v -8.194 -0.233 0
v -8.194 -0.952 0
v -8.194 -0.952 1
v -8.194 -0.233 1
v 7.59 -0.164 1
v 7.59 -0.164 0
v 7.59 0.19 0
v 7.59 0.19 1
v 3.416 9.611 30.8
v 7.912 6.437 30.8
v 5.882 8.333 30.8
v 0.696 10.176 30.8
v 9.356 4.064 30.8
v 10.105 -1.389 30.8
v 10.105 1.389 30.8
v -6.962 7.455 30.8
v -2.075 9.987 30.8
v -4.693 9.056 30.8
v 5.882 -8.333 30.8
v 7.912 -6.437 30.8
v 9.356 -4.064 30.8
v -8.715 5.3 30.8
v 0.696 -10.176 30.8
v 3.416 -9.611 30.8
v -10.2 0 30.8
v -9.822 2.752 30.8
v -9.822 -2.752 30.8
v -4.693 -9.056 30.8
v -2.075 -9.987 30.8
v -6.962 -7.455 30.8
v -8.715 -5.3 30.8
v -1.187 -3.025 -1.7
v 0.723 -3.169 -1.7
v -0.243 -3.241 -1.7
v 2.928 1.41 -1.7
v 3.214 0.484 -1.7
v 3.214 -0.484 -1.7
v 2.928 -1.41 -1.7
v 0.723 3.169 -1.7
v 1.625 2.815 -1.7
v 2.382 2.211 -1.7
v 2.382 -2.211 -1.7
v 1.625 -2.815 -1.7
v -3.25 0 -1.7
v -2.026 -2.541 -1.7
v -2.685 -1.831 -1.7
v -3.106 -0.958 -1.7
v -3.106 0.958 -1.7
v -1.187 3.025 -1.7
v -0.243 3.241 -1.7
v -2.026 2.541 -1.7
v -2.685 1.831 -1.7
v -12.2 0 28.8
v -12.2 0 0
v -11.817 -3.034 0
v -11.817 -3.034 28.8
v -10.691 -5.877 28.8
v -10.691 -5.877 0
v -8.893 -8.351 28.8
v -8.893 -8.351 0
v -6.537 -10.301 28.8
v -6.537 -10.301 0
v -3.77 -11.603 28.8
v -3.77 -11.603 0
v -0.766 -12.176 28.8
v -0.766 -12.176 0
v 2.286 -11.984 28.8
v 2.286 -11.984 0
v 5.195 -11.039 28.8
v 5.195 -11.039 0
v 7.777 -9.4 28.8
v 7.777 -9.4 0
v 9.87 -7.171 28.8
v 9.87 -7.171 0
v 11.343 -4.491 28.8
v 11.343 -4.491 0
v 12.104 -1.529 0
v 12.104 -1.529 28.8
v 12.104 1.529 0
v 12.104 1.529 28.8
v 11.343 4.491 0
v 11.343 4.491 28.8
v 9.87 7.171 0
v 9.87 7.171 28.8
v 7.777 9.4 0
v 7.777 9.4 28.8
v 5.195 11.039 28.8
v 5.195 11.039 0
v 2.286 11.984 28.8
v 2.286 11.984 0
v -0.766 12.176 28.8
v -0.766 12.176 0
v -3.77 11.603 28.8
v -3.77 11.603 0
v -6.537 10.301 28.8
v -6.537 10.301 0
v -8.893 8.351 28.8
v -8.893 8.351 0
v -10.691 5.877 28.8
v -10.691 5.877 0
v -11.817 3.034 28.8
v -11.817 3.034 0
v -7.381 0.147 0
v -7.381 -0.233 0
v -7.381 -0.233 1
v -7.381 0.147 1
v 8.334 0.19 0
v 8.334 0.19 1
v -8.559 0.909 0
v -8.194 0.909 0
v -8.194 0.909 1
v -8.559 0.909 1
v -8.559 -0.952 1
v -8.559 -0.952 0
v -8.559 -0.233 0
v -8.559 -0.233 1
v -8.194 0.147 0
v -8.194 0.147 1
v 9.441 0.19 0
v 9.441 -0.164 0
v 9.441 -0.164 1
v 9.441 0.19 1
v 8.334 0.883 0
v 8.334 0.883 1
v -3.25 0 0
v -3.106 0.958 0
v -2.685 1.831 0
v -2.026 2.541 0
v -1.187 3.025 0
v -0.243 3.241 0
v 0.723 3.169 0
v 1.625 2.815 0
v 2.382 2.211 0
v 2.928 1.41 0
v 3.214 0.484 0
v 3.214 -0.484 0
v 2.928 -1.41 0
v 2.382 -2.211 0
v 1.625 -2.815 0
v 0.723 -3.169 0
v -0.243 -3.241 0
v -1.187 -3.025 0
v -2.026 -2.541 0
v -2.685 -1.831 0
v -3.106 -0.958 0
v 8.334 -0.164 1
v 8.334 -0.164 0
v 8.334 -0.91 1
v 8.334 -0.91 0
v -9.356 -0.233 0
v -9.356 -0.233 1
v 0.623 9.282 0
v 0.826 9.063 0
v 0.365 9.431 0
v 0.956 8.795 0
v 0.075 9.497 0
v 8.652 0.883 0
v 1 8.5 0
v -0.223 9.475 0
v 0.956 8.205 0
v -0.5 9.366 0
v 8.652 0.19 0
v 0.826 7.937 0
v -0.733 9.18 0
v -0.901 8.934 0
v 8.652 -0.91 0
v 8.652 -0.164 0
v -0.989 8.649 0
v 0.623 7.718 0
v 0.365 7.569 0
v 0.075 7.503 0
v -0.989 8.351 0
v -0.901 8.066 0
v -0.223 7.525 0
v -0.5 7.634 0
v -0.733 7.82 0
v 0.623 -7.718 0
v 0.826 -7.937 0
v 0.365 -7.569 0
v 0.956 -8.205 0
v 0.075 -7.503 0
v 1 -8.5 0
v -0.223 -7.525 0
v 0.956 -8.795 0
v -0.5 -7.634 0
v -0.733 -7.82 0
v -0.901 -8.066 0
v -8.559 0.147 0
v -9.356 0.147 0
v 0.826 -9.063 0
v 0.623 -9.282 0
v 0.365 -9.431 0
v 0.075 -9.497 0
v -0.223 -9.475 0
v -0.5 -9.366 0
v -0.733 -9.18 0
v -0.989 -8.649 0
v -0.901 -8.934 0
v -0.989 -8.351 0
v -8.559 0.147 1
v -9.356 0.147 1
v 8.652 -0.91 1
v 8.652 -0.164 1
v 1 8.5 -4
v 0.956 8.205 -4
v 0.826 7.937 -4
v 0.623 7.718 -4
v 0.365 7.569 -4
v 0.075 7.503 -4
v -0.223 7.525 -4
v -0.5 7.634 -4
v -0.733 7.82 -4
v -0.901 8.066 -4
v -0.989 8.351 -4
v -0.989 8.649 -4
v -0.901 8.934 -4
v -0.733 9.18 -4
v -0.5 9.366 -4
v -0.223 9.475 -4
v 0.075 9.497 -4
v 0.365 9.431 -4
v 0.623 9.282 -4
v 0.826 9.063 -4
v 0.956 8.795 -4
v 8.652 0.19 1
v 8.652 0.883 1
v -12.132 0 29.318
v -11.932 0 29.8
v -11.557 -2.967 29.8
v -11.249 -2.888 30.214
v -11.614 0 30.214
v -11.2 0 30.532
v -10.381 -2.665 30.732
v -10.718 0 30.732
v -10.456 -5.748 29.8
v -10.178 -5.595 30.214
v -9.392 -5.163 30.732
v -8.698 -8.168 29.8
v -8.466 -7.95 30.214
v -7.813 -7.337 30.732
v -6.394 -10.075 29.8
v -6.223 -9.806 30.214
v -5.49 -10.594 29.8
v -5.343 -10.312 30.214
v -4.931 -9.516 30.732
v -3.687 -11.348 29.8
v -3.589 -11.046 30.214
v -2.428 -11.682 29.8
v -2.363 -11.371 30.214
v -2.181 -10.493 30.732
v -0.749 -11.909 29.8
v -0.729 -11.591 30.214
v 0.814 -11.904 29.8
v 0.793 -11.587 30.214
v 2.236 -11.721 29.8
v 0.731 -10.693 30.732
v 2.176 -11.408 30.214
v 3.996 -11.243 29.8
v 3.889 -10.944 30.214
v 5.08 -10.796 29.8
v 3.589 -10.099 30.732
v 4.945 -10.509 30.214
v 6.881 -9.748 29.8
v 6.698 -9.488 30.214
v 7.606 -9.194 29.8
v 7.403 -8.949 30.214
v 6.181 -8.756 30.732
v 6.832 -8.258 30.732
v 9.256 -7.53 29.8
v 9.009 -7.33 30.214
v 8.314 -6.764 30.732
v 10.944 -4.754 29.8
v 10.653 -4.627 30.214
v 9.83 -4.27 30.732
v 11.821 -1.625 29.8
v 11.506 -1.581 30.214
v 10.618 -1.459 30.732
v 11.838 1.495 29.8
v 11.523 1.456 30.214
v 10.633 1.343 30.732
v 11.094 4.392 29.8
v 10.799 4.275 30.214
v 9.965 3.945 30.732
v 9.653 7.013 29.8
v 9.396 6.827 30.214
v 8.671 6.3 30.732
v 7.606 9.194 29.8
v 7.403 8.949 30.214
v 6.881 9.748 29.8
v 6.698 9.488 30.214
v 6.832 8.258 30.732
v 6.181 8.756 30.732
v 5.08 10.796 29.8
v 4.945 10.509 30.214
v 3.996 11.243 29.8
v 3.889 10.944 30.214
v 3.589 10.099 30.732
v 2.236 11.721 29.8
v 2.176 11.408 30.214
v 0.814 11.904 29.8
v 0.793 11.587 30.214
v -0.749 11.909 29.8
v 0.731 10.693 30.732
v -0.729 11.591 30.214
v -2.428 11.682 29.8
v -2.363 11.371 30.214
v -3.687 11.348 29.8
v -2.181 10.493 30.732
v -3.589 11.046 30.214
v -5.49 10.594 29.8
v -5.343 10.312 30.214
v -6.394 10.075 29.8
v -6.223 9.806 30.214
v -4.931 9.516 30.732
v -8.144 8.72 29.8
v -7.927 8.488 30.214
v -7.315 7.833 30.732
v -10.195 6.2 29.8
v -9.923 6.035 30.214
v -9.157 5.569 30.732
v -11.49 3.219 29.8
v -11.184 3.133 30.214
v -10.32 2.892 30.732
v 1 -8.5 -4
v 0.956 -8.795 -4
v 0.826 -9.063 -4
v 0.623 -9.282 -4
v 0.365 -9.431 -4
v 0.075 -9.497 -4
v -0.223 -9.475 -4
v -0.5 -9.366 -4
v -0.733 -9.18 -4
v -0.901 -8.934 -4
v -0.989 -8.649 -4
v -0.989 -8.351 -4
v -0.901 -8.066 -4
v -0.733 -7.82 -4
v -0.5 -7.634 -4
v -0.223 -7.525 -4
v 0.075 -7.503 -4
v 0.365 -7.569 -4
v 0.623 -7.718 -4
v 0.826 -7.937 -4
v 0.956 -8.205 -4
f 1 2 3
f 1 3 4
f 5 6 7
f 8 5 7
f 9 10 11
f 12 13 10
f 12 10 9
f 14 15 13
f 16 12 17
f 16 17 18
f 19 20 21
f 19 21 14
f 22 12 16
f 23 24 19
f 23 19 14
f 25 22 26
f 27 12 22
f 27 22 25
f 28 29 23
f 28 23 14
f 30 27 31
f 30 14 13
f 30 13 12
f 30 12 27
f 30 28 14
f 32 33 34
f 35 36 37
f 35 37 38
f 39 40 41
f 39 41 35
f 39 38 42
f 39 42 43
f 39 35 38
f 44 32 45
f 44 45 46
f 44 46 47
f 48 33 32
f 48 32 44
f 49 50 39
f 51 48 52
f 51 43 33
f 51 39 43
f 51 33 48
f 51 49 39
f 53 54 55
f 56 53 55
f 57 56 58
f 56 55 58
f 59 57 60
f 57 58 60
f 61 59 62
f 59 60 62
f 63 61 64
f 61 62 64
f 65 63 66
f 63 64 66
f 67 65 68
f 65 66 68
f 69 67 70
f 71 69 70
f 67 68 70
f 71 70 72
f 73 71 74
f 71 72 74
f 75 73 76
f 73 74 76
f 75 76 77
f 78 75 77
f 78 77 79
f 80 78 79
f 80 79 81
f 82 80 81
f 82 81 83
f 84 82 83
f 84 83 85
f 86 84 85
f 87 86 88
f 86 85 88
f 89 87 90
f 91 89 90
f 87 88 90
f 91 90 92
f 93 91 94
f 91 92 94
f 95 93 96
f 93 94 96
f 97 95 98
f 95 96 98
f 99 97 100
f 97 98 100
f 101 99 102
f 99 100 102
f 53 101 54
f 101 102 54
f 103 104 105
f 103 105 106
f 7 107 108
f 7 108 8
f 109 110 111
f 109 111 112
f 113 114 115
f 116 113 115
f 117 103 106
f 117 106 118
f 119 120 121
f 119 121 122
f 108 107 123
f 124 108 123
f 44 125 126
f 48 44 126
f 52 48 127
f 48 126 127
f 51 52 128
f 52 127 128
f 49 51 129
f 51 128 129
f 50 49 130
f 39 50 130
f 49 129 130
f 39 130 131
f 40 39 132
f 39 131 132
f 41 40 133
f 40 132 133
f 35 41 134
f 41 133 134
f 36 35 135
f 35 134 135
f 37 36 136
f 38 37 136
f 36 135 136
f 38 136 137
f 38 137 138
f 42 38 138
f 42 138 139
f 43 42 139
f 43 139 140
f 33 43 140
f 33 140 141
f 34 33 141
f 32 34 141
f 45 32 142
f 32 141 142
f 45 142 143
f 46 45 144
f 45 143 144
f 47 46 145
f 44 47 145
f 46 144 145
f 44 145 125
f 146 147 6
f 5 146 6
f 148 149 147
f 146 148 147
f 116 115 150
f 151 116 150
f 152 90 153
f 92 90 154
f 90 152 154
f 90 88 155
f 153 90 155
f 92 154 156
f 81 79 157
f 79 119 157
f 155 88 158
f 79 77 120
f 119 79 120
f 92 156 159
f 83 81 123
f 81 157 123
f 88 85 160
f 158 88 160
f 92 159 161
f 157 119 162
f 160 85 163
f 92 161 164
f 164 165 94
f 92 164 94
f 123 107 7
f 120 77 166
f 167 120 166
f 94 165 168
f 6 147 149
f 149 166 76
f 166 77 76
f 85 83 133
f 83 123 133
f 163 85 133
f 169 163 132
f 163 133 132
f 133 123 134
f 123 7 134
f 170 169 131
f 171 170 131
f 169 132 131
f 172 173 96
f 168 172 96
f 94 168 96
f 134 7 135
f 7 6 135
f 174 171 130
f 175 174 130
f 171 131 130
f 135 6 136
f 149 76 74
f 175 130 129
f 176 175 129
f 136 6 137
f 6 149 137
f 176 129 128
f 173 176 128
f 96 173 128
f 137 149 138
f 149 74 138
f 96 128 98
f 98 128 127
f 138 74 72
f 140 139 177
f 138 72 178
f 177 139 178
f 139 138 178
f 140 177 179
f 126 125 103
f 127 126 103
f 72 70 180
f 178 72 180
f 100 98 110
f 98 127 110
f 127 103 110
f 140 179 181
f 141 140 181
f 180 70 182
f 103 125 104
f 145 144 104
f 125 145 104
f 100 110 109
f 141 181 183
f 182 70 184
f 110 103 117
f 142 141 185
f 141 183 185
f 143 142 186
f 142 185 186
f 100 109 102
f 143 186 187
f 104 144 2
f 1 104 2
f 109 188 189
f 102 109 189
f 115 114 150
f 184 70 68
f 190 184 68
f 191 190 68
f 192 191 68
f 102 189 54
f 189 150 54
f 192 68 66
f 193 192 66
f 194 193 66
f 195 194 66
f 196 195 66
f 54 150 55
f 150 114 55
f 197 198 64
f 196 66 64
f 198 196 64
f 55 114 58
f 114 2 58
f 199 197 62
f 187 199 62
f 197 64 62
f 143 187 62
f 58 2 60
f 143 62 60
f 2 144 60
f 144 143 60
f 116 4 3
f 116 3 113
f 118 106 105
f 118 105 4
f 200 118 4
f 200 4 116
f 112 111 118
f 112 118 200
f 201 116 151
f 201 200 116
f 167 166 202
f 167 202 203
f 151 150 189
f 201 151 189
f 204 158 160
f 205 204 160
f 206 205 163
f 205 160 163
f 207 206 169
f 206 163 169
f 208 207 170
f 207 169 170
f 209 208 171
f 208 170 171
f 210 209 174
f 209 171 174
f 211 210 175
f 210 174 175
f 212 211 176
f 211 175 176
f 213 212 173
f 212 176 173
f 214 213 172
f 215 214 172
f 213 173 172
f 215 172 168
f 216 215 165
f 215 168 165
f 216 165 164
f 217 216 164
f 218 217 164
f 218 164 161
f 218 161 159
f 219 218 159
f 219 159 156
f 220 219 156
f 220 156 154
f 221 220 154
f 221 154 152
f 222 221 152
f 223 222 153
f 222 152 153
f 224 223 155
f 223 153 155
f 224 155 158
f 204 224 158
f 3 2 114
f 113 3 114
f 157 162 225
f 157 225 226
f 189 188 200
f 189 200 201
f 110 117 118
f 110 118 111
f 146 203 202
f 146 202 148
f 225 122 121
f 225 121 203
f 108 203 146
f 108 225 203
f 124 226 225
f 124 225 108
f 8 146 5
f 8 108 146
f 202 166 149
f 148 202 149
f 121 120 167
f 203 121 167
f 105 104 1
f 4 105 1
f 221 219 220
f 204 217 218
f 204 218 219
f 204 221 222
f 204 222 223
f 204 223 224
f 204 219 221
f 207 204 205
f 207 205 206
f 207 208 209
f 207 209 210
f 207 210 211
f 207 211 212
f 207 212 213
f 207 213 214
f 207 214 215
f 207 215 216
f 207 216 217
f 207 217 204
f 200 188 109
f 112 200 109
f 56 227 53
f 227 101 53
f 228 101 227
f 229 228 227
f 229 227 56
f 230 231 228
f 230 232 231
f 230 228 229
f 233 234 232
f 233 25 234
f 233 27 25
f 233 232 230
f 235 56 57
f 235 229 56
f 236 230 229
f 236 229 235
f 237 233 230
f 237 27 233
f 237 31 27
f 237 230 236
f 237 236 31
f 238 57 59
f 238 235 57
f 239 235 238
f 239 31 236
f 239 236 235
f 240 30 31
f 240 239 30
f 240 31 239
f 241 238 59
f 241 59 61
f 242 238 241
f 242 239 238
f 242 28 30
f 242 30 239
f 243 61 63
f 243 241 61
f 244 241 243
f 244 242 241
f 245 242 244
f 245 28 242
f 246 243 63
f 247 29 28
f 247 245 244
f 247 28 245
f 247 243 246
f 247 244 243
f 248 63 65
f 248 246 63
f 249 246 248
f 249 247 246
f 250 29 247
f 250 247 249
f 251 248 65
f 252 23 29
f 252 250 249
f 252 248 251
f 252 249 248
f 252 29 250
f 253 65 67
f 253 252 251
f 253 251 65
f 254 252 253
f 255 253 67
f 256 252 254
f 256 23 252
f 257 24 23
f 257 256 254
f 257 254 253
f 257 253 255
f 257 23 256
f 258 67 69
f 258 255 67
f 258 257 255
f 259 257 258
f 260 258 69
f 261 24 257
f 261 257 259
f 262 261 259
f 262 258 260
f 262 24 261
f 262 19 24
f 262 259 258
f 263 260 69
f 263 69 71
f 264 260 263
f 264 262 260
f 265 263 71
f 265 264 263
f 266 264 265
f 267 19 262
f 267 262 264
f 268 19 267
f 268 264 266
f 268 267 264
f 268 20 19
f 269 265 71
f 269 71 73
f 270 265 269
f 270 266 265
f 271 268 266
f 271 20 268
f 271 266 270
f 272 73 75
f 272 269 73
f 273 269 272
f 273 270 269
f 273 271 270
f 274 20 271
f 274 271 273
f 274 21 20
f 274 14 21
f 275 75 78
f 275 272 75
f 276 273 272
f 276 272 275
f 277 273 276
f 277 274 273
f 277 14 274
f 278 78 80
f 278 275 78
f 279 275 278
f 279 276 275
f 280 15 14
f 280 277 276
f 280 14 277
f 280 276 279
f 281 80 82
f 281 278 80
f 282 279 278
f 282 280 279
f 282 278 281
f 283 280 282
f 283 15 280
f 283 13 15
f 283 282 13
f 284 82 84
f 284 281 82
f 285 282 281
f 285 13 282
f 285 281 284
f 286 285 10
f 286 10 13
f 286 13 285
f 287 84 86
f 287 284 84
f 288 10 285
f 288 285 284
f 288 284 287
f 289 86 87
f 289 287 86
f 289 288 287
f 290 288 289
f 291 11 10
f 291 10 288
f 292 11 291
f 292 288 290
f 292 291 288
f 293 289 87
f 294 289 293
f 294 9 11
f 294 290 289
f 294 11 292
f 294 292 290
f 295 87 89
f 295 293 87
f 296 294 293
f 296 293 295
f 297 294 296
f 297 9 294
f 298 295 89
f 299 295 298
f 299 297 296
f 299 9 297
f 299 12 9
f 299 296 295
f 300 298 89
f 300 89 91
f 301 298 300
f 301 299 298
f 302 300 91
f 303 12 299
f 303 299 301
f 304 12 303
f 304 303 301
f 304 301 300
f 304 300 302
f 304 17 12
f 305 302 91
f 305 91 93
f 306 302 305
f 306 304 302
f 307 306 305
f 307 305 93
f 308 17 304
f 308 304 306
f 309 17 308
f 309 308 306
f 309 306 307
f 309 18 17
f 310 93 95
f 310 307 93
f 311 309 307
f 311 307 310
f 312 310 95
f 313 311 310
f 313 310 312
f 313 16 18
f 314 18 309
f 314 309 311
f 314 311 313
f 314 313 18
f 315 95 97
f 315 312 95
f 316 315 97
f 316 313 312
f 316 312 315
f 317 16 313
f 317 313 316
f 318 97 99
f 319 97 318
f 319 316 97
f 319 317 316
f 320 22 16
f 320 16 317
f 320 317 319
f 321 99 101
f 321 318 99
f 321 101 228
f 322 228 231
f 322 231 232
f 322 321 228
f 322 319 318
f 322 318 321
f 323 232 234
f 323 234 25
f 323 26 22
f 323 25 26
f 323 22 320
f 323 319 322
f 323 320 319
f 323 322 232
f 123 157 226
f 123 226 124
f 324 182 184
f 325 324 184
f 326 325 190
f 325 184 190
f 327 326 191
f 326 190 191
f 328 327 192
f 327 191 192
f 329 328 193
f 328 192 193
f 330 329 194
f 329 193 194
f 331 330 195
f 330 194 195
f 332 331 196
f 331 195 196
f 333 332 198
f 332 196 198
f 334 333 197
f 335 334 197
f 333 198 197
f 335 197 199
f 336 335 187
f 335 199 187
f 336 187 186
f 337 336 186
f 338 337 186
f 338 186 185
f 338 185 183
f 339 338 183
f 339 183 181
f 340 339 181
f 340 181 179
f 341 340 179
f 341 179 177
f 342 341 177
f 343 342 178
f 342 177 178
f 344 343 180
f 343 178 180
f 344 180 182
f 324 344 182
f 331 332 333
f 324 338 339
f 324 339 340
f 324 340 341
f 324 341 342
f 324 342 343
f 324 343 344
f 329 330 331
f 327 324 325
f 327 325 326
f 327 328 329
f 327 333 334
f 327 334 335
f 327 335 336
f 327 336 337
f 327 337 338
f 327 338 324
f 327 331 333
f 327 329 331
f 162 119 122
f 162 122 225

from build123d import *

# Parameters (mm, degrees)
SKETCH_1_R          = 12.2
EXTRUDE_1_DEPTH     = 30.8
FILLET_1_R          = 2
SKETCH_2_R          = 3.25
EXTRUDE_2_DEPTH     = 1.7
SKETCH_5_R          = 1
EXTRUDE_4_DEPTH     = 4
SKETCH_7_W          = 1.851248616
SKETCH_7_H          = 0.354328631
CUT_EXTRUDE_1_DEPTH = 1
SKETCH_8_W          = 0.317488429
SKETCH_8_H          = 1.793967755
CUT_EXTRUDE_2_DEPTH = 1
SKETCH_10_W         = 0.364887613
SKETCH_10_H         = 1.860802793
CUT_EXTRUDE_4_DEPTH = 1
SKETCH_11_W         = 1.9755237
SKETCH_11_H         = 0.380671715
CUT_EXTRUDE_5_DEPTH = 1


with BuildPart() as part:
    # 草图1 → 凸台-拉伸1 (new body)
    with BuildSketch(Plane.XY):
        with Locations(Location((0, 0, 0), (0, 0, 180))):
            Circle(SKETCH_1_R)
    extrude(amount=EXTRUDE_1_DEPTH)

    # 圆角1
    fillet_1_edges = [part.edges().sort_by_distance(p)[0] for p in [
        (12.2, 0, 30.8),
    ]]
    fillet(fillet_1_edges, radius=FILLET_1_R)

    # 草图2 → 凸台-拉伸2 (add)
    with BuildSketch(Plane(origin=(0, 0, 0), x_dir=(-1, 0, 0), z_dir=(0, 0, -1))):
        Circle(SKETCH_2_R)
    extrude(amount=EXTRUDE_2_DEPTH)

    # 草图5 → 凸台-拉伸4 (add)
    with BuildSketch(Plane(origin=(0, 0, 0), x_dir=(-1, 0, 0), z_dir=(0, 0, -1))):
        with Locations(Location((0, -8.5, 0), (0, 0, 180))):
            Circle(SKETCH_5_R)
        with Locations(Location((0, 8.5, 0), (0, 0, 180))):
            Circle(SKETCH_5_R)
    extrude(amount=EXTRUDE_4_DEPTH)

    # 草图7 → 切除-拉伸1 (cut)
    with BuildSketch(Plane(origin=(0, 0, 0), x_dir=(-1, 0, 0), z_dir=(0, 0, -1))):
        with Locations((-8.515796524, 0.01329556)):
            Rectangle(SKETCH_7_W, SKETCH_7_H)
    extrude(amount=-CUT_EXTRUDE_1_DEPTH, mode=Mode.SUBTRACT)

    # 草图8 → 切除-拉伸2 (cut)
    with BuildSketch(Plane(origin=(0, 0, 0), x_dir=(-1, 0, 0), z_dir=(0, 0, -1))):
        with Locations((-8.493083651, -0.013515685)):
            Rectangle(SKETCH_8_W, SKETCH_8_H)
    extrude(amount=-CUT_EXTRUDE_2_DEPTH, mode=Mode.SUBTRACT)

    # 草图10 → 切除-拉伸4 (cut)
    with BuildSketch(Plane(origin=(0, 0, 0), x_dir=(-1, 0, 0), z_dir=(0, 0, -1))):
        with Locations((8.376136345, -0.021771447)):
            Rectangle(SKETCH_10_W, SKETCH_10_H)
    extrude(amount=-CUT_EXTRUDE_4_DEPTH, mode=Mode.SUBTRACT)

    # 草图11 → 切除-拉伸5 (cut)
    with BuildSketch(Plane(origin=(0, 0, 0), x_dir=(-1, 0, 0), z_dir=(0, 0, -1))):
        with Locations((8.368475893, -0.042969493)):
            Rectangle(SKETCH_11_W, SKETCH_11_H)
    extrude(amount=-CUT_EXTRUDE_5_DEPTH, mode=Mode.SUBTRACT)


solid = part.part
